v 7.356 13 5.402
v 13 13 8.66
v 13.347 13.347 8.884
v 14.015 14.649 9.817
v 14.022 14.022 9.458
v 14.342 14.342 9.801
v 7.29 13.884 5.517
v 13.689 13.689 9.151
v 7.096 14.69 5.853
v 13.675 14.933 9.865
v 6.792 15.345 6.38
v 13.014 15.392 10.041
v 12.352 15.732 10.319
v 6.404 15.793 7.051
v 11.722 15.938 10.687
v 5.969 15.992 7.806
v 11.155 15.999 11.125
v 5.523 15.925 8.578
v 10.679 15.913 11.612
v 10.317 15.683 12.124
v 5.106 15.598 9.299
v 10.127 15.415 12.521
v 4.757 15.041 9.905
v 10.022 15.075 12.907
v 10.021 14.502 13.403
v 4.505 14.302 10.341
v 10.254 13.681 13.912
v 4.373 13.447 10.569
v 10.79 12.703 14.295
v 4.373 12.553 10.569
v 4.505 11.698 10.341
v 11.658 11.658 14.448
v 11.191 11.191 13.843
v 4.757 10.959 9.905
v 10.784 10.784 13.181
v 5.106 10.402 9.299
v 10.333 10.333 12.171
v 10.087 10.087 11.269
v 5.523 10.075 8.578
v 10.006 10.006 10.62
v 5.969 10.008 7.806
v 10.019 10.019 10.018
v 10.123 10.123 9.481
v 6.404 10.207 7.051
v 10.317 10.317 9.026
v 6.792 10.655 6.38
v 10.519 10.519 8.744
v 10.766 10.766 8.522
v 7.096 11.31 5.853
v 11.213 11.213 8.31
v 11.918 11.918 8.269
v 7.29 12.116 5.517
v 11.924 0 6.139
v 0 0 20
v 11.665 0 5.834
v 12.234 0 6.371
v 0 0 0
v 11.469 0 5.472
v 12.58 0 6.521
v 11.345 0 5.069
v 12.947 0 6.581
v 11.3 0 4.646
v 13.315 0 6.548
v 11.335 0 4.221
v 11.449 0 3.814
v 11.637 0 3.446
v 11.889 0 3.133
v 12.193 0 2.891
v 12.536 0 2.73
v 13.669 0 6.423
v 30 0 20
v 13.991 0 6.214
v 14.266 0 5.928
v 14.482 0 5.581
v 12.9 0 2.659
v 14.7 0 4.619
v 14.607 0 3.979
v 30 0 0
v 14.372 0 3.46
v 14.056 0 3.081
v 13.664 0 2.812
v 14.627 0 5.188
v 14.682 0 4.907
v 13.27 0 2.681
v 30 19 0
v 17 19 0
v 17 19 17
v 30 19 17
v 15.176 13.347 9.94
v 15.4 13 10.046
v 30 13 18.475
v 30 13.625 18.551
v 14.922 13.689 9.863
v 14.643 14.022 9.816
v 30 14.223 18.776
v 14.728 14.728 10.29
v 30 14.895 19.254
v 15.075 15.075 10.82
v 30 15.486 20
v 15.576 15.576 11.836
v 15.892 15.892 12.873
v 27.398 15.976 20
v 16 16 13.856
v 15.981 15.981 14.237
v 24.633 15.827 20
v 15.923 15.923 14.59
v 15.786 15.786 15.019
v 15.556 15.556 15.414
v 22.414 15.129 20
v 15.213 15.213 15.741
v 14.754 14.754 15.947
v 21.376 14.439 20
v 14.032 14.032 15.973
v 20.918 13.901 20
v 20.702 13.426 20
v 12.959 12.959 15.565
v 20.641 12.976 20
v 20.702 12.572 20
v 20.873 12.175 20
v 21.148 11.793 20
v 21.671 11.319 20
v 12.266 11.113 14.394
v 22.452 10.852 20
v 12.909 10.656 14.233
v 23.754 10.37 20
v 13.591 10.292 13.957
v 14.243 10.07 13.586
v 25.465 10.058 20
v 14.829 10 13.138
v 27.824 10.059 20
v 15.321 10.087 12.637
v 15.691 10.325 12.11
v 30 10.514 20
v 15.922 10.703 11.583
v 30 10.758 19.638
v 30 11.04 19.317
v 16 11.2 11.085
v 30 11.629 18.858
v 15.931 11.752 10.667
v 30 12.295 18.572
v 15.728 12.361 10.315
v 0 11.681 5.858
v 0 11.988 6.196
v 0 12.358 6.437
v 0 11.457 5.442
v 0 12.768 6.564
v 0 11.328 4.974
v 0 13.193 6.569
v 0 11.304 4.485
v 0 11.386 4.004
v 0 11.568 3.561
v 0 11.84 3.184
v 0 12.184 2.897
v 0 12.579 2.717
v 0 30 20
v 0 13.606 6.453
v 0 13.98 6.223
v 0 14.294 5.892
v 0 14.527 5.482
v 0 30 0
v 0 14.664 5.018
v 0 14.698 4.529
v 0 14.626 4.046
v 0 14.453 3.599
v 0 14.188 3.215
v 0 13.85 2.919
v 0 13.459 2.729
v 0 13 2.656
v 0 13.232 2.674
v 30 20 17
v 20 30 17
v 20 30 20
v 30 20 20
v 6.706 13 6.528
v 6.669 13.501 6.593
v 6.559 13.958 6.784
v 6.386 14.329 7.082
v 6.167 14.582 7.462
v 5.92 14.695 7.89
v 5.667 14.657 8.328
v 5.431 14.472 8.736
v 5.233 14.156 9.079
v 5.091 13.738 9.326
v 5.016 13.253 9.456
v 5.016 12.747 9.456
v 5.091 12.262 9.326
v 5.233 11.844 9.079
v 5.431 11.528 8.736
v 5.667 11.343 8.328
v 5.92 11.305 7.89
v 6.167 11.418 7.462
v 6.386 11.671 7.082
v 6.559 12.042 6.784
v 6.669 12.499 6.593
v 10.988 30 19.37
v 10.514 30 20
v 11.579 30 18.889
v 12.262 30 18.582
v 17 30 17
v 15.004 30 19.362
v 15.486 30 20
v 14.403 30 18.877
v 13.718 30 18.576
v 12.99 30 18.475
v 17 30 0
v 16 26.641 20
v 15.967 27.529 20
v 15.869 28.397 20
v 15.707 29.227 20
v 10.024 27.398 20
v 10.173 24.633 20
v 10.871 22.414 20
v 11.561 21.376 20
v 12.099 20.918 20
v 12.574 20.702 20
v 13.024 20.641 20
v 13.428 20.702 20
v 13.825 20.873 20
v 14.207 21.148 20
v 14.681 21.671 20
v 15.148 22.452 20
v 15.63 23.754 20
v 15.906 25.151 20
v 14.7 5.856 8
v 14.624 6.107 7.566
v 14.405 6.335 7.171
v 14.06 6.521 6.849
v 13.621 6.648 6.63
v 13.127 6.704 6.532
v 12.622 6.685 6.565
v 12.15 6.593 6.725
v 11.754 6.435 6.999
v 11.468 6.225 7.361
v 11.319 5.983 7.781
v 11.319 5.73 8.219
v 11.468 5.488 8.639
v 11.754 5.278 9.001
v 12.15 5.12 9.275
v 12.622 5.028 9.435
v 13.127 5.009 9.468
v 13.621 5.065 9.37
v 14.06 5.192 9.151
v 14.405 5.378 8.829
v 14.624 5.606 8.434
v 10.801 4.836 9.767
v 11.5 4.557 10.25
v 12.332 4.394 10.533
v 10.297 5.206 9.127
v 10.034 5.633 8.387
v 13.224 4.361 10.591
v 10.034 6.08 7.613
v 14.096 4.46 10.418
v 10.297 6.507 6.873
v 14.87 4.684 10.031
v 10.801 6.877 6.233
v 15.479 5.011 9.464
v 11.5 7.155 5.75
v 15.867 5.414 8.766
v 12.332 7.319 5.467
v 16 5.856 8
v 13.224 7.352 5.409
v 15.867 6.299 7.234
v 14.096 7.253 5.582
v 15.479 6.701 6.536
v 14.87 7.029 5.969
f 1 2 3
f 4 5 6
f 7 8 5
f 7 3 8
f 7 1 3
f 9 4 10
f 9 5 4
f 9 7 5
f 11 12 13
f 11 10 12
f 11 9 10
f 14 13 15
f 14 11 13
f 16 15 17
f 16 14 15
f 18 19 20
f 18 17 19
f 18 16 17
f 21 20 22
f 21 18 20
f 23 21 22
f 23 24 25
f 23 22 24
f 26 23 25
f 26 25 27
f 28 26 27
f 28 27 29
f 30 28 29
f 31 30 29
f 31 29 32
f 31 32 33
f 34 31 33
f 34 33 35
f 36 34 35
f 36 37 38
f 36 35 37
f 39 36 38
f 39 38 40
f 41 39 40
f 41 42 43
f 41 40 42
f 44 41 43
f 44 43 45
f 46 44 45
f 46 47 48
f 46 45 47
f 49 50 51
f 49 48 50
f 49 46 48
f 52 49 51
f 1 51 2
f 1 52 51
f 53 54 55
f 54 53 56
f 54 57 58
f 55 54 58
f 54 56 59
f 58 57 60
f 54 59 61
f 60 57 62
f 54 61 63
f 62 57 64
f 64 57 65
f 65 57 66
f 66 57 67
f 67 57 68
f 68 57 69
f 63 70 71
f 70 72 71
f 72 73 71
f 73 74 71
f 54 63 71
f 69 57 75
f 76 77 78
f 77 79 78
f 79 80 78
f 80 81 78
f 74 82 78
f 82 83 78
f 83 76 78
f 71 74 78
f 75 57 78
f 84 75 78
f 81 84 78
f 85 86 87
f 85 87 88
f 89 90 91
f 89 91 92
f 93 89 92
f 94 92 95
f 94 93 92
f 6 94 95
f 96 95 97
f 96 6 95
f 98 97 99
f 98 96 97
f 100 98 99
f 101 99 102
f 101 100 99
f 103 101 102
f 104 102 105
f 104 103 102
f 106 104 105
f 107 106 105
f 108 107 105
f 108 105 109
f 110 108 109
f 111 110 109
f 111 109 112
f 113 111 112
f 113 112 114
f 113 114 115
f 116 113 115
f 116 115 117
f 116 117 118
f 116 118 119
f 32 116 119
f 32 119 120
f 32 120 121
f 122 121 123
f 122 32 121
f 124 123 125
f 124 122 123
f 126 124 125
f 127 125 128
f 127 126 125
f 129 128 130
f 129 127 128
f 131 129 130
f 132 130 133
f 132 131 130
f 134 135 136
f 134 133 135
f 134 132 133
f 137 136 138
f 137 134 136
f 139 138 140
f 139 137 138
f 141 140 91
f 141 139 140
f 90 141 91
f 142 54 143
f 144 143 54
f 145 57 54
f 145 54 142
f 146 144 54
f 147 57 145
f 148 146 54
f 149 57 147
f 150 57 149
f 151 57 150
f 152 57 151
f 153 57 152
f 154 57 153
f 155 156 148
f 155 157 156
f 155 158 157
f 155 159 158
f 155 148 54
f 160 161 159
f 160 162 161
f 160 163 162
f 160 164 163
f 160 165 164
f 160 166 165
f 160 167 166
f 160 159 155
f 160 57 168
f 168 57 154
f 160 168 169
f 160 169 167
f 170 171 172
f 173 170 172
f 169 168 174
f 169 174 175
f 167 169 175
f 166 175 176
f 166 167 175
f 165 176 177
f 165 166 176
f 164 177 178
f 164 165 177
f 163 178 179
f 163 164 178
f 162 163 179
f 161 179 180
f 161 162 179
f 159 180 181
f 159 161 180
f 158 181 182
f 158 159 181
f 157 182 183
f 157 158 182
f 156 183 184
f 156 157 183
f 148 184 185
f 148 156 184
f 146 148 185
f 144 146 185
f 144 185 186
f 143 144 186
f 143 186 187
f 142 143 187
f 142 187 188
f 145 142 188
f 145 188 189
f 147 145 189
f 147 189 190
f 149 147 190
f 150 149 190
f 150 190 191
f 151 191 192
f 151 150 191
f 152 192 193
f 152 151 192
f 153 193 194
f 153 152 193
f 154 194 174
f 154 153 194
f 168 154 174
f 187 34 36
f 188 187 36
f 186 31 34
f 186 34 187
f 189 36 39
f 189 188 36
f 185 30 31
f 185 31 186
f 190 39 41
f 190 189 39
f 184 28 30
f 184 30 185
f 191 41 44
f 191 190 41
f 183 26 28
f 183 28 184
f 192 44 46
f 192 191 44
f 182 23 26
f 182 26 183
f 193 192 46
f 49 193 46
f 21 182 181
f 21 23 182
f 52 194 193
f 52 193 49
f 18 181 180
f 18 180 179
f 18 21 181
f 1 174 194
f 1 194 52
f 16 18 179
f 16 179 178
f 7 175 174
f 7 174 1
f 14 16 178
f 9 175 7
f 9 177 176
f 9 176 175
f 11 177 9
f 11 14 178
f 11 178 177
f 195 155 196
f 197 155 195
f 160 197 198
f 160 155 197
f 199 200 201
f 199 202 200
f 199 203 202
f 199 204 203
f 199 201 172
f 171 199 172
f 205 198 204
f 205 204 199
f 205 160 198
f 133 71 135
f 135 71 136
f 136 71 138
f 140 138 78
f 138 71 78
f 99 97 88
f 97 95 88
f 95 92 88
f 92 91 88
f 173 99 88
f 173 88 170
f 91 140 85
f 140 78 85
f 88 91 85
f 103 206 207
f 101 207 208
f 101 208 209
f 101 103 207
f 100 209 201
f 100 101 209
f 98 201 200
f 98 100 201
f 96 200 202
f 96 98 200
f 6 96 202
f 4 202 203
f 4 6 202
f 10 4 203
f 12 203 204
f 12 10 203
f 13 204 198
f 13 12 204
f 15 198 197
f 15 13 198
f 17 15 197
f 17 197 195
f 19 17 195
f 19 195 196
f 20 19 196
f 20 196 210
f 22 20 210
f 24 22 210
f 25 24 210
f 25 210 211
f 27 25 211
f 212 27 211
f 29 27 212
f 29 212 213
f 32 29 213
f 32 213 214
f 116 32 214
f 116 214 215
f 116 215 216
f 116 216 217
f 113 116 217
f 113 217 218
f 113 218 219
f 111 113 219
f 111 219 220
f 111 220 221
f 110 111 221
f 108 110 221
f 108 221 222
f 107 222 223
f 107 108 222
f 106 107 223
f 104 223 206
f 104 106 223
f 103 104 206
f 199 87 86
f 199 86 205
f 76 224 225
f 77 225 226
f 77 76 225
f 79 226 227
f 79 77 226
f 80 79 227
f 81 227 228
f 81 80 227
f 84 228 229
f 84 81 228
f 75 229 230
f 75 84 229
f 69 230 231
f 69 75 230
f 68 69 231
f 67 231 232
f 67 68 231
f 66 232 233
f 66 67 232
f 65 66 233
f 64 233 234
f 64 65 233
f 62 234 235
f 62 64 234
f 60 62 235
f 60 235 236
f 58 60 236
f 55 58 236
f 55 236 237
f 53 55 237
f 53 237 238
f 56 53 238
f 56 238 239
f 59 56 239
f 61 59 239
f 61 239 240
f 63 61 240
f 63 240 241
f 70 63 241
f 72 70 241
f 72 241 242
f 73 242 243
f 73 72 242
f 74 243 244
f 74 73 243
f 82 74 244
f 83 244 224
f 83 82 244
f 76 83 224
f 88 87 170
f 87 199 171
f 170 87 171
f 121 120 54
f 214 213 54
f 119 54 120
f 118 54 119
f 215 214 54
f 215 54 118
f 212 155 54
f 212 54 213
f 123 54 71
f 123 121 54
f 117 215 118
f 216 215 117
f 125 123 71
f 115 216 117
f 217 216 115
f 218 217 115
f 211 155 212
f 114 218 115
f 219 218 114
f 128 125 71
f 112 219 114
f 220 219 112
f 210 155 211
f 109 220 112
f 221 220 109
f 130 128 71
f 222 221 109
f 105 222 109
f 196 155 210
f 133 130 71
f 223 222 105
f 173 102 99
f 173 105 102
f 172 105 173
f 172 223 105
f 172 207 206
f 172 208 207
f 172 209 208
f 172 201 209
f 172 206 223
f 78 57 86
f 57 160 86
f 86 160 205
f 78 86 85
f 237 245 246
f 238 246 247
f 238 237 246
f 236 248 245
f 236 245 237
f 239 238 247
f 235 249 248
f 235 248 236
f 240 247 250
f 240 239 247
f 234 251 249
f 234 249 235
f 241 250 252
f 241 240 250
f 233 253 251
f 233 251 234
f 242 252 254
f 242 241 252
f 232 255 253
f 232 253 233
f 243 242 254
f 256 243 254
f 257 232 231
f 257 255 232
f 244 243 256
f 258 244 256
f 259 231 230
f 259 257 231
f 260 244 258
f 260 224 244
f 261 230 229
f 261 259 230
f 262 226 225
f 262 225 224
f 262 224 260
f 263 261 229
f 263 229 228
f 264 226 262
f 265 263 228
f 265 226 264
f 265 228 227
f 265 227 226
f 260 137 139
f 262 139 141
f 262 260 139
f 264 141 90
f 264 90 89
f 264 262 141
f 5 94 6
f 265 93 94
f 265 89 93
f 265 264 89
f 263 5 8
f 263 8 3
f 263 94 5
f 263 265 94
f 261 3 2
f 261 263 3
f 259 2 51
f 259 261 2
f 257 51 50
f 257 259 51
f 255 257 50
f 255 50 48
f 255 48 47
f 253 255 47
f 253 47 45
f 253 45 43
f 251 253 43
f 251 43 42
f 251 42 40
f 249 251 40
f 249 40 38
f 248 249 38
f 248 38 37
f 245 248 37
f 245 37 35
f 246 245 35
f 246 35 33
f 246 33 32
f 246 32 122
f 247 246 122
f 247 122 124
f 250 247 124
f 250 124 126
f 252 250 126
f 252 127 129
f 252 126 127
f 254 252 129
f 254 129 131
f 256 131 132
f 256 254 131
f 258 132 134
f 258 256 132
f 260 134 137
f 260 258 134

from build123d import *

# Parameters (mm, degrees)
CYLINDER001_R        = 3
CYLINDER001_DEPTH    = 40
CYLINDER_R           = 1.7
CYLINDER_DEPTH       = 40
FUSION001_ROLL_ANGLE = -60
FUSION_PITCH_ANGLE   = 60
BOX001_W             = 18
BOX001_H             = 19
BOX001_DEPTH         = 20
BOX_W                = 30
BOX_H                = 30
BOX_DEPTH            = 20
CHAMFER_SIZE         = 10


with BuildPart() as cylinder001:
    # Cylinder001 → Cylinder001 (new body)
    with BuildSketch(Plane.XY.offset(16)):
        Circle(CYLINDER001_R)
    extrude(amount=CYLINDER001_DEPTH)


with BuildPart() as cylinder:
    # Cylinder → Cylinder (new body)
    with BuildSketch(Plane.XY):
        Circle(CYLINDER_R)
    extrude(amount=CYLINDER_DEPTH)


with BuildPart() as screw001:
    # Fusion001 base: copy of Cylinder
    add(cylinder.part)

    # Fusion001: union Cylinder001
    add(cylinder001.part)


with BuildPart() as screw001_1:
    # Fusion001 roll: moved
    add(screw001.part.rotate(Axis((0, 0, 0), (1, 0, 0)), FUSION001_ROLL_ANGLE))


with BuildPart() as screw001_2:
    # Fusion001 placement: moved
    add(screw001_1.part.moved(Location((13, -8, 0))))


with BuildPart() as fusion002:
    # Fusion base: copy of Cylinder
    add(cylinder.part)

    # Fusion: union Cylinder001
    add(cylinder001.part)


with BuildPart() as fusion002_1:
    # Fusion pitch: moved
    add(fusion002.part.rotate(Axis((0, 0, 0), (0, 1, 0)), FUSION_PITCH_ANGLE))


with BuildPart() as fusion002_2:
    # Fusion placement: moved
    add(fusion002_1.part.moved(Location((-8, 13, 0))))

    # Fusion002: union screw001
    add(screw001_2.part)


with BuildPart() as cube001:
    # Box001 → Box001 (new body)
    with BuildSketch(Plane(origin=(17, 19, -3), x_dir=(1, 0, 0), z_dir=(0, 0, 1))):
        with Locations((9, 9.5)):
            Rectangle(BOX001_W, BOX001_H)
    extrude(amount=BOX001_DEPTH)


with BuildPart() as cut001:
    # Box → Box (new body)
    with BuildSketch(Plane.XY):
        with Locations((15, 15)):
            Rectangle(BOX_W, BOX_H)
    extrude(amount=BOX_DEPTH)

    # Chamfer
    chamfer_edges = [cut001.edges().sort_by_distance(p)[0] for p in [
        (30, 30, 10),
    ]]
    chamfer(chamfer_edges, length=CHAMFER_SIZE)

    # Cut: cut Cube001
    add(cube001.part, mode=Mode.SUBTRACT)

    # Cut001: cut Fusion002
    add(fusion002_2.part, mode=Mode.SUBTRACT)


solid = cut001.part
